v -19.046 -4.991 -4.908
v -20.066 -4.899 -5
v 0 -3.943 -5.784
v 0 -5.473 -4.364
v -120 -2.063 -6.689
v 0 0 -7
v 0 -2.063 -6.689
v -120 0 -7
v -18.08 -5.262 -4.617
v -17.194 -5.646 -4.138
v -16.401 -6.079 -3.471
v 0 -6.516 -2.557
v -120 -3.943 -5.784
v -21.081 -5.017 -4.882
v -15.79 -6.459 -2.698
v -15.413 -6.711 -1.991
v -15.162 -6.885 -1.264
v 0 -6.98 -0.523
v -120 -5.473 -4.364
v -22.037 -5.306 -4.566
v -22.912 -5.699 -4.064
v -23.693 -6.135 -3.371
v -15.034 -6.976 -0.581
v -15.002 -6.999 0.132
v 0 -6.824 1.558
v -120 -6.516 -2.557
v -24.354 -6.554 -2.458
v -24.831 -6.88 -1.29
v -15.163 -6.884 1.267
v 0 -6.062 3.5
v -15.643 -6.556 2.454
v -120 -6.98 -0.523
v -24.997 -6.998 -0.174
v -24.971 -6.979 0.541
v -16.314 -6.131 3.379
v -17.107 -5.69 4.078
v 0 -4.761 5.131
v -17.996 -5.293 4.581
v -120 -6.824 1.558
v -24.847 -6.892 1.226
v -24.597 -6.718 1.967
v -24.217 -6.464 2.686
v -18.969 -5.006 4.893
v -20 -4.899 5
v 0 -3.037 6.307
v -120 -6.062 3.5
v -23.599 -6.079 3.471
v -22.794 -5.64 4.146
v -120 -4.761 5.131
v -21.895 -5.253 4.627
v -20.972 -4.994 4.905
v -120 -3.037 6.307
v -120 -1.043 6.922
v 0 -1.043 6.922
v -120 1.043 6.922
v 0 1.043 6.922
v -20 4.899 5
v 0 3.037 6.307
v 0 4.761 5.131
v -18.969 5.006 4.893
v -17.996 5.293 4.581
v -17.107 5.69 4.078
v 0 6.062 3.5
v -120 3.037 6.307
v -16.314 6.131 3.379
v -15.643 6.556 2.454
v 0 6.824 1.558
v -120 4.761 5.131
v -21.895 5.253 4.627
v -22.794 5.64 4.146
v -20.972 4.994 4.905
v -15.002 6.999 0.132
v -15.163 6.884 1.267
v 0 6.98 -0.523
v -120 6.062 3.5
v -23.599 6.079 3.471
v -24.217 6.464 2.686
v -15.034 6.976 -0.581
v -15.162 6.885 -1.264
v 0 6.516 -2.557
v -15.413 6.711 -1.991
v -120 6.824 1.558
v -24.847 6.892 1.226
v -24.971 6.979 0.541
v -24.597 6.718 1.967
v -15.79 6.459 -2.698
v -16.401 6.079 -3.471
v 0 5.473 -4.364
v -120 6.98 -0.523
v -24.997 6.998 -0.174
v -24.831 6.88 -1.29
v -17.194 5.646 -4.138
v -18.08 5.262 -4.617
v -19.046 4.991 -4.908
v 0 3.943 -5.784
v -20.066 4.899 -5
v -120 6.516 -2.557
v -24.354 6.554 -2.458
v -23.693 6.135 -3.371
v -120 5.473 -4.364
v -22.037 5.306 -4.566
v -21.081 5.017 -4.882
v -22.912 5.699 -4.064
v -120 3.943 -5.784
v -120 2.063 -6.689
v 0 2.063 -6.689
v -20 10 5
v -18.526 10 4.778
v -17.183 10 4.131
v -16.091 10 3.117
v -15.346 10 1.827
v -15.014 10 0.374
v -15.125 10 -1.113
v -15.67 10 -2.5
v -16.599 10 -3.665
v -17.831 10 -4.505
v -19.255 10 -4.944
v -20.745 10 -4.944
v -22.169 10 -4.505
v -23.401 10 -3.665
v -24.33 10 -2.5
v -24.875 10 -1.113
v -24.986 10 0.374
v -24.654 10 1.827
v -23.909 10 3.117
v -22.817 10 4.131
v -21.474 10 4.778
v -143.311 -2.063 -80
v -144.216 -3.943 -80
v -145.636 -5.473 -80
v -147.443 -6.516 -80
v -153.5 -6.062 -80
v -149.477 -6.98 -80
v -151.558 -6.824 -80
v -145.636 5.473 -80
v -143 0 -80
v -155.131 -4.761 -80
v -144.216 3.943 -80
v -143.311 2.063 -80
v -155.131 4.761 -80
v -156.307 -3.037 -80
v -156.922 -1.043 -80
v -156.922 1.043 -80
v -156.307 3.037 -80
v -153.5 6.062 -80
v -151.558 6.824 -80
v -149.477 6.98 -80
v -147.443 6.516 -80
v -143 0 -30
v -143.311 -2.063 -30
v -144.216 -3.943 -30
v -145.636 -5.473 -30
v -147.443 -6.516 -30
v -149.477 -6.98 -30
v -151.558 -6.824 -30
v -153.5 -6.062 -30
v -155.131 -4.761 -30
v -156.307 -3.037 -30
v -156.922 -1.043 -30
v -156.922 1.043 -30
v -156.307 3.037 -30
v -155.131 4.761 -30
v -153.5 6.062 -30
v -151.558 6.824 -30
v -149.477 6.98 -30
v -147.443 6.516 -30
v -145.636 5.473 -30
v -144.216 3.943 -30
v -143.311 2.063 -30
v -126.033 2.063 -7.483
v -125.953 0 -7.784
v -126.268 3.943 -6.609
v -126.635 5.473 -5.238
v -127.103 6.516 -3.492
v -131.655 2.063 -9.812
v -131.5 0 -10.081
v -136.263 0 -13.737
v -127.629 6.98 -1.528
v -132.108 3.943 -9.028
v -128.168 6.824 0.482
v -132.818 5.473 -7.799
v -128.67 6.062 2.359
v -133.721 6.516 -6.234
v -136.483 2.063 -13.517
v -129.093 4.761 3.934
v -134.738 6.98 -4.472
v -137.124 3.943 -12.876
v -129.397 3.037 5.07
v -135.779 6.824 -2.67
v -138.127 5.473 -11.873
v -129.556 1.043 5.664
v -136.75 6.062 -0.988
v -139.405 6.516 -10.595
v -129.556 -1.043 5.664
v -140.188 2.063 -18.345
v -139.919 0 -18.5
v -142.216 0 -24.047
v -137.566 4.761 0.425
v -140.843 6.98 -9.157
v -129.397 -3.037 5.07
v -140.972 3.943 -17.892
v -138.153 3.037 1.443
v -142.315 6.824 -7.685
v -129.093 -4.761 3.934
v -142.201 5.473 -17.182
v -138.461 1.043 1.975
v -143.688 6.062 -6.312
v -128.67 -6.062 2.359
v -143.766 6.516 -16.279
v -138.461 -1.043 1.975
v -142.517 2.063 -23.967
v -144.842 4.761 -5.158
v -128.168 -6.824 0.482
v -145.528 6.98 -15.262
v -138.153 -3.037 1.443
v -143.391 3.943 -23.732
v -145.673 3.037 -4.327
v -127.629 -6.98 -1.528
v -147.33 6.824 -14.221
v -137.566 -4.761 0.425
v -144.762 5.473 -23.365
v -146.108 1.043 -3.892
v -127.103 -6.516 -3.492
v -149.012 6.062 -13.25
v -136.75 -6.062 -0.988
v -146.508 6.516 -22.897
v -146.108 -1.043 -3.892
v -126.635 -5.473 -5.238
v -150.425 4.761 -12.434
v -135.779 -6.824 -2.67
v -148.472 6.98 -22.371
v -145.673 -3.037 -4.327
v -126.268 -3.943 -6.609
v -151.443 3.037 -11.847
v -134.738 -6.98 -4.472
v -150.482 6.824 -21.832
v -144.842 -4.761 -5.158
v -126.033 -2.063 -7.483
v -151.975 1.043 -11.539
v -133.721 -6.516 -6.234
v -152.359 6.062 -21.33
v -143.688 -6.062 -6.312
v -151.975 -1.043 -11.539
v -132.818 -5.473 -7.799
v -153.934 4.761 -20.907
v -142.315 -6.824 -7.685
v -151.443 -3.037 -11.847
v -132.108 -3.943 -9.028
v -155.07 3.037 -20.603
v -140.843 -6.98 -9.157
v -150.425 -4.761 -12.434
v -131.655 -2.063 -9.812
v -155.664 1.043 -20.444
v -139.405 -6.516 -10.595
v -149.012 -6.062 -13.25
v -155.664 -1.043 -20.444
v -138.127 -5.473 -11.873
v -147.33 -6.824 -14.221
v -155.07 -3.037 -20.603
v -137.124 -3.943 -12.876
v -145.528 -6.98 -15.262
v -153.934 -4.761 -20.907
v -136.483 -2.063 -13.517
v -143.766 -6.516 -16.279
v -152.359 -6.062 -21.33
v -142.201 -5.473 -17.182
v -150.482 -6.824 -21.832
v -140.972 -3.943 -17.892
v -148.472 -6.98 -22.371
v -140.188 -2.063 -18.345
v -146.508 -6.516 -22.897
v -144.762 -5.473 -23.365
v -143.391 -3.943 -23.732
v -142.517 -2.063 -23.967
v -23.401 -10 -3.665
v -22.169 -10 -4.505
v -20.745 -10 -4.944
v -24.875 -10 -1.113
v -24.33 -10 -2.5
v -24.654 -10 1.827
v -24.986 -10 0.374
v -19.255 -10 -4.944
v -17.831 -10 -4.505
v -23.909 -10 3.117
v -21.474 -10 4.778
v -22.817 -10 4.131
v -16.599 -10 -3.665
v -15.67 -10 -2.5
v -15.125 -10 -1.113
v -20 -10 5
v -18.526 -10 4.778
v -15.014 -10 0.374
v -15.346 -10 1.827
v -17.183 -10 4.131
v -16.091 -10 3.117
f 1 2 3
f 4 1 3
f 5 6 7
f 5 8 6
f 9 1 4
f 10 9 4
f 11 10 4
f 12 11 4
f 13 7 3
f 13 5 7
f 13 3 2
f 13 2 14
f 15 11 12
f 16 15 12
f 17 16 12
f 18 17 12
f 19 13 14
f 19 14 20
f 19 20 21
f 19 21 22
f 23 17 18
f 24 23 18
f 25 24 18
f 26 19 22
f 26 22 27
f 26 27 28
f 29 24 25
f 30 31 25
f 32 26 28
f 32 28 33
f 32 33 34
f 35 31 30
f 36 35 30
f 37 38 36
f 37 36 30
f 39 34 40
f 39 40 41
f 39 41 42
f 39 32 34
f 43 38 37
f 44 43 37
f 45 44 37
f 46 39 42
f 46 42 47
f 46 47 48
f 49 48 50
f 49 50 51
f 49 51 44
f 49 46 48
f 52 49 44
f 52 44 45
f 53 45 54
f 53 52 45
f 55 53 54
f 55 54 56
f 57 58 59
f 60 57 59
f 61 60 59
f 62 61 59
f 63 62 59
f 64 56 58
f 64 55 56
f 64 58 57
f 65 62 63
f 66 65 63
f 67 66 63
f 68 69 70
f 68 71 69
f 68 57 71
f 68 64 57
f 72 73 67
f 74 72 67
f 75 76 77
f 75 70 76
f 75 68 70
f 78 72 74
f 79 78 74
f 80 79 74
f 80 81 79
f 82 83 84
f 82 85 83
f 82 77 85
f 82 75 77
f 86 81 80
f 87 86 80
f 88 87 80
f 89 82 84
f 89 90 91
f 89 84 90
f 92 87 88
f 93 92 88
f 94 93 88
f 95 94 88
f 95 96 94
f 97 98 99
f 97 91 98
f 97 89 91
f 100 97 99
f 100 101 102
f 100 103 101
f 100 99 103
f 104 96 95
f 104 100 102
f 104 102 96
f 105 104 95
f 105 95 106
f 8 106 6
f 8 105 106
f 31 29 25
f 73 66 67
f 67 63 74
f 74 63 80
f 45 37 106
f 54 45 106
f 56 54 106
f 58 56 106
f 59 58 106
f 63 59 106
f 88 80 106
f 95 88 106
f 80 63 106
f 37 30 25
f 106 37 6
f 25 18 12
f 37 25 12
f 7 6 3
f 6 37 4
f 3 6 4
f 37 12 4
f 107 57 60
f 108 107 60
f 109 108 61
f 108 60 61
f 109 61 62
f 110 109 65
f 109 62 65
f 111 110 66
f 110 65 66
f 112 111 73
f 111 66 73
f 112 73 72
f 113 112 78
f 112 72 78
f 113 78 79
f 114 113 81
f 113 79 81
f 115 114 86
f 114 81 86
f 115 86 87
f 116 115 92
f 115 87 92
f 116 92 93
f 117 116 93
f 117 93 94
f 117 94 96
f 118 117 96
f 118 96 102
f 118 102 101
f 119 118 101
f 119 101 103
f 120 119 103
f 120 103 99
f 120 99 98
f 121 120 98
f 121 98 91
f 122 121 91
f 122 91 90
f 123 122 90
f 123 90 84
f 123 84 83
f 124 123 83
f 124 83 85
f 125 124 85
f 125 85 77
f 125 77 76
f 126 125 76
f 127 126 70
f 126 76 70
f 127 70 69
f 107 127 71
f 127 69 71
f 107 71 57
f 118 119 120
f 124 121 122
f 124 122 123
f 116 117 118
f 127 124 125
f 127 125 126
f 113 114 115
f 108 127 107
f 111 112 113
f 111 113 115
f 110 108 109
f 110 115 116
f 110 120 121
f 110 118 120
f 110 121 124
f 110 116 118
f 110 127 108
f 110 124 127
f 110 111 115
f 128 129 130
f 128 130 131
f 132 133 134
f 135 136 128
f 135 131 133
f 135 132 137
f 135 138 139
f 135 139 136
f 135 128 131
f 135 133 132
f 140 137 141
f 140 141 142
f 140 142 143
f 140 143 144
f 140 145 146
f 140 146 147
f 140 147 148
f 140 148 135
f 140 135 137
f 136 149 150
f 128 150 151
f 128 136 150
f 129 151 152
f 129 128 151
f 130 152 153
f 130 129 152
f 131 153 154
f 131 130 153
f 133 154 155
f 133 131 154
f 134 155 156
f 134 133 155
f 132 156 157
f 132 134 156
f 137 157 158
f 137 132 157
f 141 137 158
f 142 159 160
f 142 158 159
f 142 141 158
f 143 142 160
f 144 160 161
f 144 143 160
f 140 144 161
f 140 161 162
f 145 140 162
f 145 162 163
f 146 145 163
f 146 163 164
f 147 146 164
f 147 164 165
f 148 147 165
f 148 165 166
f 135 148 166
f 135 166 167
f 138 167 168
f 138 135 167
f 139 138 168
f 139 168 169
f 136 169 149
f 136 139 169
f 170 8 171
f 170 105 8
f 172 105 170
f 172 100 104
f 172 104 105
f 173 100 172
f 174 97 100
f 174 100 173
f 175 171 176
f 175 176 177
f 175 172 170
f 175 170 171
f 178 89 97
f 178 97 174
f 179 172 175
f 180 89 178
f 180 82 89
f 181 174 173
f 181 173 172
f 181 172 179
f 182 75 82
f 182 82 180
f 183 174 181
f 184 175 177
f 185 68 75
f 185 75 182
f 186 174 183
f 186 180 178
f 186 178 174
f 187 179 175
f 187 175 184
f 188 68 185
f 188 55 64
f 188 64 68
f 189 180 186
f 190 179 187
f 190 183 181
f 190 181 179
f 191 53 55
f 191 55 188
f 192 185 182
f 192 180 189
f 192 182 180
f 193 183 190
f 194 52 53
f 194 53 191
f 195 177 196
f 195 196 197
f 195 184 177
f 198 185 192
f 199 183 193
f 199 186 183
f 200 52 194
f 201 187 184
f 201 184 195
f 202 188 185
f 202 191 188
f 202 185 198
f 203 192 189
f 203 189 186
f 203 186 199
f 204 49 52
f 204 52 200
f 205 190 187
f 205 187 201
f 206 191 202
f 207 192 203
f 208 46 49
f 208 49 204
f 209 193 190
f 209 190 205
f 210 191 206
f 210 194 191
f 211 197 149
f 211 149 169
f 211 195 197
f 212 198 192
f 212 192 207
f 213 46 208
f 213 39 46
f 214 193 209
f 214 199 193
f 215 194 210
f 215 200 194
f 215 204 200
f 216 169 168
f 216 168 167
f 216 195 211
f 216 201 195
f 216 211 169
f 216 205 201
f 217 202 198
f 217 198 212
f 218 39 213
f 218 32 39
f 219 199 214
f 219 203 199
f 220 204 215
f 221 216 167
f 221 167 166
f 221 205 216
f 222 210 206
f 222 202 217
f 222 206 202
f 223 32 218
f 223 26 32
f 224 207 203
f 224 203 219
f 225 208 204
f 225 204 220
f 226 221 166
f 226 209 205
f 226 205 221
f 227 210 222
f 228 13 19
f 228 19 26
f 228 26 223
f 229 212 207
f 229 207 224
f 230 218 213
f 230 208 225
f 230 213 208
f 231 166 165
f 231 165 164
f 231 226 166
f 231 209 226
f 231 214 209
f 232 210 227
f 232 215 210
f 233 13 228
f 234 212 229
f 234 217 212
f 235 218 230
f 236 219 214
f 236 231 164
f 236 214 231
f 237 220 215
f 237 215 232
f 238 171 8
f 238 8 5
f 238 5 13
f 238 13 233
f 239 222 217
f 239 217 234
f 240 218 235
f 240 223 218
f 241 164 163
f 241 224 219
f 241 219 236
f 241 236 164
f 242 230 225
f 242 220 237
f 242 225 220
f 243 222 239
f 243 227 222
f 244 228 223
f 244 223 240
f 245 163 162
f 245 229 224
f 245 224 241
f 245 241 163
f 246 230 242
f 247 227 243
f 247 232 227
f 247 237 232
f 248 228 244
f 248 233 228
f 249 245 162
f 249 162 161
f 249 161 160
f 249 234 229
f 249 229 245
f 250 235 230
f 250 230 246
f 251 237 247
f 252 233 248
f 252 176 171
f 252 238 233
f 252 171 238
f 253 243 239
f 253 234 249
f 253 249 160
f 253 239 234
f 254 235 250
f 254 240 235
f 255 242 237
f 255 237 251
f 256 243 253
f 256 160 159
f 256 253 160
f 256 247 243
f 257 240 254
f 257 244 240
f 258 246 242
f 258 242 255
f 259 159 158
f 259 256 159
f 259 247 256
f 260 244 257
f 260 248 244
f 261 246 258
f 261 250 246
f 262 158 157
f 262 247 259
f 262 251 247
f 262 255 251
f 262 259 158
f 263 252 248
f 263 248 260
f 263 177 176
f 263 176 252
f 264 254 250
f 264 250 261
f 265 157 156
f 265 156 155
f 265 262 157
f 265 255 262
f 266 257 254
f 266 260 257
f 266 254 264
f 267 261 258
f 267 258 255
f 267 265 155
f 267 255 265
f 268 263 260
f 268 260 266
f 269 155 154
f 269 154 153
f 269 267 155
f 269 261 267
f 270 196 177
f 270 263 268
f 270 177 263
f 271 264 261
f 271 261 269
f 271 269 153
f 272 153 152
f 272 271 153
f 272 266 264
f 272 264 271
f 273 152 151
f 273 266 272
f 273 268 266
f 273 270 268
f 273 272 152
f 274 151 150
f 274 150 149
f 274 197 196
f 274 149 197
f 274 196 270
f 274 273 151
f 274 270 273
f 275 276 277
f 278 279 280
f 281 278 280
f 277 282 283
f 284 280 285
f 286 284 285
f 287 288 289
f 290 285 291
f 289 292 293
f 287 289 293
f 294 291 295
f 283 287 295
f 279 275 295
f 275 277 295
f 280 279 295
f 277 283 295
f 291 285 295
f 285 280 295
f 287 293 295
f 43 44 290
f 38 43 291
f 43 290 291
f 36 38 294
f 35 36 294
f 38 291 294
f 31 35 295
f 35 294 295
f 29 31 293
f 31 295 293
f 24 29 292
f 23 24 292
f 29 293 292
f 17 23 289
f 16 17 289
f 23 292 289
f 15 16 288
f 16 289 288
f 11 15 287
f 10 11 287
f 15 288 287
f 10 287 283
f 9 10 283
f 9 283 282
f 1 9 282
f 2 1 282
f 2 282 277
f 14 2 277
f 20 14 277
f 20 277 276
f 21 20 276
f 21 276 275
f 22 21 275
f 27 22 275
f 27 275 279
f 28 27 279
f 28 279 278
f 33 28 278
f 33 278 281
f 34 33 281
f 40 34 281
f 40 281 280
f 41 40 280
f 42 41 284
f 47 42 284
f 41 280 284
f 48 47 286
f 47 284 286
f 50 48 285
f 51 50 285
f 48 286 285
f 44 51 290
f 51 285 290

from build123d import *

# Parameters (mm, degrees)
SWEEP1_PROFILE_R         = 7
BOSS_EXTRUDE1_DEPTH      = 10
BOSS_EXTRUDE1_DEPTH_BACK = 10
SKETCH8_R                = 5


with BuildPart() as part:
    # Sweep1: sweep along a path in Sketch1
    with BuildLine(Plane(origin=(0, 0, 0), x_dir=(1, 0, 0), z_dir=(0, 1, 0))) as sweep1_path:
        Line((0, 0), (-120, 0))
        ThreePointArc((-120, 0), (-141.213203436, 8.786796564), (-150, 30))
        Line((-150, 30), (-150, 80))
    # Sweep1 profile (on start of the path) → Sweep1 (sweep)
    with BuildSketch(Plane(origin=(0, 0, 0), x_dir=(0, 0, -1), z_dir=(-1, 0, 0))):
        Circle(SWEEP1_PROFILE_R)
    sweep(path=sweep1_path.line)

    # Sketch8 → Boss-Extrude1 (add, two sides: drawn at the far end of the back side and taken through both)
    with BuildSketch(Plane(origin=(0, 0, 0), x_dir=(1, 0, 0), z_dir=(0, 1, 0)).offset(-BOSS_EXTRUDE1_DEPTH_BACK)):
        with Locations((-20, 0)):
            Circle(SKETCH8_R)
    extrude(amount=BOSS_EXTRUDE1_DEPTH + BOSS_EXTRUDE1_DEPTH_BACK)


solid = part.part
